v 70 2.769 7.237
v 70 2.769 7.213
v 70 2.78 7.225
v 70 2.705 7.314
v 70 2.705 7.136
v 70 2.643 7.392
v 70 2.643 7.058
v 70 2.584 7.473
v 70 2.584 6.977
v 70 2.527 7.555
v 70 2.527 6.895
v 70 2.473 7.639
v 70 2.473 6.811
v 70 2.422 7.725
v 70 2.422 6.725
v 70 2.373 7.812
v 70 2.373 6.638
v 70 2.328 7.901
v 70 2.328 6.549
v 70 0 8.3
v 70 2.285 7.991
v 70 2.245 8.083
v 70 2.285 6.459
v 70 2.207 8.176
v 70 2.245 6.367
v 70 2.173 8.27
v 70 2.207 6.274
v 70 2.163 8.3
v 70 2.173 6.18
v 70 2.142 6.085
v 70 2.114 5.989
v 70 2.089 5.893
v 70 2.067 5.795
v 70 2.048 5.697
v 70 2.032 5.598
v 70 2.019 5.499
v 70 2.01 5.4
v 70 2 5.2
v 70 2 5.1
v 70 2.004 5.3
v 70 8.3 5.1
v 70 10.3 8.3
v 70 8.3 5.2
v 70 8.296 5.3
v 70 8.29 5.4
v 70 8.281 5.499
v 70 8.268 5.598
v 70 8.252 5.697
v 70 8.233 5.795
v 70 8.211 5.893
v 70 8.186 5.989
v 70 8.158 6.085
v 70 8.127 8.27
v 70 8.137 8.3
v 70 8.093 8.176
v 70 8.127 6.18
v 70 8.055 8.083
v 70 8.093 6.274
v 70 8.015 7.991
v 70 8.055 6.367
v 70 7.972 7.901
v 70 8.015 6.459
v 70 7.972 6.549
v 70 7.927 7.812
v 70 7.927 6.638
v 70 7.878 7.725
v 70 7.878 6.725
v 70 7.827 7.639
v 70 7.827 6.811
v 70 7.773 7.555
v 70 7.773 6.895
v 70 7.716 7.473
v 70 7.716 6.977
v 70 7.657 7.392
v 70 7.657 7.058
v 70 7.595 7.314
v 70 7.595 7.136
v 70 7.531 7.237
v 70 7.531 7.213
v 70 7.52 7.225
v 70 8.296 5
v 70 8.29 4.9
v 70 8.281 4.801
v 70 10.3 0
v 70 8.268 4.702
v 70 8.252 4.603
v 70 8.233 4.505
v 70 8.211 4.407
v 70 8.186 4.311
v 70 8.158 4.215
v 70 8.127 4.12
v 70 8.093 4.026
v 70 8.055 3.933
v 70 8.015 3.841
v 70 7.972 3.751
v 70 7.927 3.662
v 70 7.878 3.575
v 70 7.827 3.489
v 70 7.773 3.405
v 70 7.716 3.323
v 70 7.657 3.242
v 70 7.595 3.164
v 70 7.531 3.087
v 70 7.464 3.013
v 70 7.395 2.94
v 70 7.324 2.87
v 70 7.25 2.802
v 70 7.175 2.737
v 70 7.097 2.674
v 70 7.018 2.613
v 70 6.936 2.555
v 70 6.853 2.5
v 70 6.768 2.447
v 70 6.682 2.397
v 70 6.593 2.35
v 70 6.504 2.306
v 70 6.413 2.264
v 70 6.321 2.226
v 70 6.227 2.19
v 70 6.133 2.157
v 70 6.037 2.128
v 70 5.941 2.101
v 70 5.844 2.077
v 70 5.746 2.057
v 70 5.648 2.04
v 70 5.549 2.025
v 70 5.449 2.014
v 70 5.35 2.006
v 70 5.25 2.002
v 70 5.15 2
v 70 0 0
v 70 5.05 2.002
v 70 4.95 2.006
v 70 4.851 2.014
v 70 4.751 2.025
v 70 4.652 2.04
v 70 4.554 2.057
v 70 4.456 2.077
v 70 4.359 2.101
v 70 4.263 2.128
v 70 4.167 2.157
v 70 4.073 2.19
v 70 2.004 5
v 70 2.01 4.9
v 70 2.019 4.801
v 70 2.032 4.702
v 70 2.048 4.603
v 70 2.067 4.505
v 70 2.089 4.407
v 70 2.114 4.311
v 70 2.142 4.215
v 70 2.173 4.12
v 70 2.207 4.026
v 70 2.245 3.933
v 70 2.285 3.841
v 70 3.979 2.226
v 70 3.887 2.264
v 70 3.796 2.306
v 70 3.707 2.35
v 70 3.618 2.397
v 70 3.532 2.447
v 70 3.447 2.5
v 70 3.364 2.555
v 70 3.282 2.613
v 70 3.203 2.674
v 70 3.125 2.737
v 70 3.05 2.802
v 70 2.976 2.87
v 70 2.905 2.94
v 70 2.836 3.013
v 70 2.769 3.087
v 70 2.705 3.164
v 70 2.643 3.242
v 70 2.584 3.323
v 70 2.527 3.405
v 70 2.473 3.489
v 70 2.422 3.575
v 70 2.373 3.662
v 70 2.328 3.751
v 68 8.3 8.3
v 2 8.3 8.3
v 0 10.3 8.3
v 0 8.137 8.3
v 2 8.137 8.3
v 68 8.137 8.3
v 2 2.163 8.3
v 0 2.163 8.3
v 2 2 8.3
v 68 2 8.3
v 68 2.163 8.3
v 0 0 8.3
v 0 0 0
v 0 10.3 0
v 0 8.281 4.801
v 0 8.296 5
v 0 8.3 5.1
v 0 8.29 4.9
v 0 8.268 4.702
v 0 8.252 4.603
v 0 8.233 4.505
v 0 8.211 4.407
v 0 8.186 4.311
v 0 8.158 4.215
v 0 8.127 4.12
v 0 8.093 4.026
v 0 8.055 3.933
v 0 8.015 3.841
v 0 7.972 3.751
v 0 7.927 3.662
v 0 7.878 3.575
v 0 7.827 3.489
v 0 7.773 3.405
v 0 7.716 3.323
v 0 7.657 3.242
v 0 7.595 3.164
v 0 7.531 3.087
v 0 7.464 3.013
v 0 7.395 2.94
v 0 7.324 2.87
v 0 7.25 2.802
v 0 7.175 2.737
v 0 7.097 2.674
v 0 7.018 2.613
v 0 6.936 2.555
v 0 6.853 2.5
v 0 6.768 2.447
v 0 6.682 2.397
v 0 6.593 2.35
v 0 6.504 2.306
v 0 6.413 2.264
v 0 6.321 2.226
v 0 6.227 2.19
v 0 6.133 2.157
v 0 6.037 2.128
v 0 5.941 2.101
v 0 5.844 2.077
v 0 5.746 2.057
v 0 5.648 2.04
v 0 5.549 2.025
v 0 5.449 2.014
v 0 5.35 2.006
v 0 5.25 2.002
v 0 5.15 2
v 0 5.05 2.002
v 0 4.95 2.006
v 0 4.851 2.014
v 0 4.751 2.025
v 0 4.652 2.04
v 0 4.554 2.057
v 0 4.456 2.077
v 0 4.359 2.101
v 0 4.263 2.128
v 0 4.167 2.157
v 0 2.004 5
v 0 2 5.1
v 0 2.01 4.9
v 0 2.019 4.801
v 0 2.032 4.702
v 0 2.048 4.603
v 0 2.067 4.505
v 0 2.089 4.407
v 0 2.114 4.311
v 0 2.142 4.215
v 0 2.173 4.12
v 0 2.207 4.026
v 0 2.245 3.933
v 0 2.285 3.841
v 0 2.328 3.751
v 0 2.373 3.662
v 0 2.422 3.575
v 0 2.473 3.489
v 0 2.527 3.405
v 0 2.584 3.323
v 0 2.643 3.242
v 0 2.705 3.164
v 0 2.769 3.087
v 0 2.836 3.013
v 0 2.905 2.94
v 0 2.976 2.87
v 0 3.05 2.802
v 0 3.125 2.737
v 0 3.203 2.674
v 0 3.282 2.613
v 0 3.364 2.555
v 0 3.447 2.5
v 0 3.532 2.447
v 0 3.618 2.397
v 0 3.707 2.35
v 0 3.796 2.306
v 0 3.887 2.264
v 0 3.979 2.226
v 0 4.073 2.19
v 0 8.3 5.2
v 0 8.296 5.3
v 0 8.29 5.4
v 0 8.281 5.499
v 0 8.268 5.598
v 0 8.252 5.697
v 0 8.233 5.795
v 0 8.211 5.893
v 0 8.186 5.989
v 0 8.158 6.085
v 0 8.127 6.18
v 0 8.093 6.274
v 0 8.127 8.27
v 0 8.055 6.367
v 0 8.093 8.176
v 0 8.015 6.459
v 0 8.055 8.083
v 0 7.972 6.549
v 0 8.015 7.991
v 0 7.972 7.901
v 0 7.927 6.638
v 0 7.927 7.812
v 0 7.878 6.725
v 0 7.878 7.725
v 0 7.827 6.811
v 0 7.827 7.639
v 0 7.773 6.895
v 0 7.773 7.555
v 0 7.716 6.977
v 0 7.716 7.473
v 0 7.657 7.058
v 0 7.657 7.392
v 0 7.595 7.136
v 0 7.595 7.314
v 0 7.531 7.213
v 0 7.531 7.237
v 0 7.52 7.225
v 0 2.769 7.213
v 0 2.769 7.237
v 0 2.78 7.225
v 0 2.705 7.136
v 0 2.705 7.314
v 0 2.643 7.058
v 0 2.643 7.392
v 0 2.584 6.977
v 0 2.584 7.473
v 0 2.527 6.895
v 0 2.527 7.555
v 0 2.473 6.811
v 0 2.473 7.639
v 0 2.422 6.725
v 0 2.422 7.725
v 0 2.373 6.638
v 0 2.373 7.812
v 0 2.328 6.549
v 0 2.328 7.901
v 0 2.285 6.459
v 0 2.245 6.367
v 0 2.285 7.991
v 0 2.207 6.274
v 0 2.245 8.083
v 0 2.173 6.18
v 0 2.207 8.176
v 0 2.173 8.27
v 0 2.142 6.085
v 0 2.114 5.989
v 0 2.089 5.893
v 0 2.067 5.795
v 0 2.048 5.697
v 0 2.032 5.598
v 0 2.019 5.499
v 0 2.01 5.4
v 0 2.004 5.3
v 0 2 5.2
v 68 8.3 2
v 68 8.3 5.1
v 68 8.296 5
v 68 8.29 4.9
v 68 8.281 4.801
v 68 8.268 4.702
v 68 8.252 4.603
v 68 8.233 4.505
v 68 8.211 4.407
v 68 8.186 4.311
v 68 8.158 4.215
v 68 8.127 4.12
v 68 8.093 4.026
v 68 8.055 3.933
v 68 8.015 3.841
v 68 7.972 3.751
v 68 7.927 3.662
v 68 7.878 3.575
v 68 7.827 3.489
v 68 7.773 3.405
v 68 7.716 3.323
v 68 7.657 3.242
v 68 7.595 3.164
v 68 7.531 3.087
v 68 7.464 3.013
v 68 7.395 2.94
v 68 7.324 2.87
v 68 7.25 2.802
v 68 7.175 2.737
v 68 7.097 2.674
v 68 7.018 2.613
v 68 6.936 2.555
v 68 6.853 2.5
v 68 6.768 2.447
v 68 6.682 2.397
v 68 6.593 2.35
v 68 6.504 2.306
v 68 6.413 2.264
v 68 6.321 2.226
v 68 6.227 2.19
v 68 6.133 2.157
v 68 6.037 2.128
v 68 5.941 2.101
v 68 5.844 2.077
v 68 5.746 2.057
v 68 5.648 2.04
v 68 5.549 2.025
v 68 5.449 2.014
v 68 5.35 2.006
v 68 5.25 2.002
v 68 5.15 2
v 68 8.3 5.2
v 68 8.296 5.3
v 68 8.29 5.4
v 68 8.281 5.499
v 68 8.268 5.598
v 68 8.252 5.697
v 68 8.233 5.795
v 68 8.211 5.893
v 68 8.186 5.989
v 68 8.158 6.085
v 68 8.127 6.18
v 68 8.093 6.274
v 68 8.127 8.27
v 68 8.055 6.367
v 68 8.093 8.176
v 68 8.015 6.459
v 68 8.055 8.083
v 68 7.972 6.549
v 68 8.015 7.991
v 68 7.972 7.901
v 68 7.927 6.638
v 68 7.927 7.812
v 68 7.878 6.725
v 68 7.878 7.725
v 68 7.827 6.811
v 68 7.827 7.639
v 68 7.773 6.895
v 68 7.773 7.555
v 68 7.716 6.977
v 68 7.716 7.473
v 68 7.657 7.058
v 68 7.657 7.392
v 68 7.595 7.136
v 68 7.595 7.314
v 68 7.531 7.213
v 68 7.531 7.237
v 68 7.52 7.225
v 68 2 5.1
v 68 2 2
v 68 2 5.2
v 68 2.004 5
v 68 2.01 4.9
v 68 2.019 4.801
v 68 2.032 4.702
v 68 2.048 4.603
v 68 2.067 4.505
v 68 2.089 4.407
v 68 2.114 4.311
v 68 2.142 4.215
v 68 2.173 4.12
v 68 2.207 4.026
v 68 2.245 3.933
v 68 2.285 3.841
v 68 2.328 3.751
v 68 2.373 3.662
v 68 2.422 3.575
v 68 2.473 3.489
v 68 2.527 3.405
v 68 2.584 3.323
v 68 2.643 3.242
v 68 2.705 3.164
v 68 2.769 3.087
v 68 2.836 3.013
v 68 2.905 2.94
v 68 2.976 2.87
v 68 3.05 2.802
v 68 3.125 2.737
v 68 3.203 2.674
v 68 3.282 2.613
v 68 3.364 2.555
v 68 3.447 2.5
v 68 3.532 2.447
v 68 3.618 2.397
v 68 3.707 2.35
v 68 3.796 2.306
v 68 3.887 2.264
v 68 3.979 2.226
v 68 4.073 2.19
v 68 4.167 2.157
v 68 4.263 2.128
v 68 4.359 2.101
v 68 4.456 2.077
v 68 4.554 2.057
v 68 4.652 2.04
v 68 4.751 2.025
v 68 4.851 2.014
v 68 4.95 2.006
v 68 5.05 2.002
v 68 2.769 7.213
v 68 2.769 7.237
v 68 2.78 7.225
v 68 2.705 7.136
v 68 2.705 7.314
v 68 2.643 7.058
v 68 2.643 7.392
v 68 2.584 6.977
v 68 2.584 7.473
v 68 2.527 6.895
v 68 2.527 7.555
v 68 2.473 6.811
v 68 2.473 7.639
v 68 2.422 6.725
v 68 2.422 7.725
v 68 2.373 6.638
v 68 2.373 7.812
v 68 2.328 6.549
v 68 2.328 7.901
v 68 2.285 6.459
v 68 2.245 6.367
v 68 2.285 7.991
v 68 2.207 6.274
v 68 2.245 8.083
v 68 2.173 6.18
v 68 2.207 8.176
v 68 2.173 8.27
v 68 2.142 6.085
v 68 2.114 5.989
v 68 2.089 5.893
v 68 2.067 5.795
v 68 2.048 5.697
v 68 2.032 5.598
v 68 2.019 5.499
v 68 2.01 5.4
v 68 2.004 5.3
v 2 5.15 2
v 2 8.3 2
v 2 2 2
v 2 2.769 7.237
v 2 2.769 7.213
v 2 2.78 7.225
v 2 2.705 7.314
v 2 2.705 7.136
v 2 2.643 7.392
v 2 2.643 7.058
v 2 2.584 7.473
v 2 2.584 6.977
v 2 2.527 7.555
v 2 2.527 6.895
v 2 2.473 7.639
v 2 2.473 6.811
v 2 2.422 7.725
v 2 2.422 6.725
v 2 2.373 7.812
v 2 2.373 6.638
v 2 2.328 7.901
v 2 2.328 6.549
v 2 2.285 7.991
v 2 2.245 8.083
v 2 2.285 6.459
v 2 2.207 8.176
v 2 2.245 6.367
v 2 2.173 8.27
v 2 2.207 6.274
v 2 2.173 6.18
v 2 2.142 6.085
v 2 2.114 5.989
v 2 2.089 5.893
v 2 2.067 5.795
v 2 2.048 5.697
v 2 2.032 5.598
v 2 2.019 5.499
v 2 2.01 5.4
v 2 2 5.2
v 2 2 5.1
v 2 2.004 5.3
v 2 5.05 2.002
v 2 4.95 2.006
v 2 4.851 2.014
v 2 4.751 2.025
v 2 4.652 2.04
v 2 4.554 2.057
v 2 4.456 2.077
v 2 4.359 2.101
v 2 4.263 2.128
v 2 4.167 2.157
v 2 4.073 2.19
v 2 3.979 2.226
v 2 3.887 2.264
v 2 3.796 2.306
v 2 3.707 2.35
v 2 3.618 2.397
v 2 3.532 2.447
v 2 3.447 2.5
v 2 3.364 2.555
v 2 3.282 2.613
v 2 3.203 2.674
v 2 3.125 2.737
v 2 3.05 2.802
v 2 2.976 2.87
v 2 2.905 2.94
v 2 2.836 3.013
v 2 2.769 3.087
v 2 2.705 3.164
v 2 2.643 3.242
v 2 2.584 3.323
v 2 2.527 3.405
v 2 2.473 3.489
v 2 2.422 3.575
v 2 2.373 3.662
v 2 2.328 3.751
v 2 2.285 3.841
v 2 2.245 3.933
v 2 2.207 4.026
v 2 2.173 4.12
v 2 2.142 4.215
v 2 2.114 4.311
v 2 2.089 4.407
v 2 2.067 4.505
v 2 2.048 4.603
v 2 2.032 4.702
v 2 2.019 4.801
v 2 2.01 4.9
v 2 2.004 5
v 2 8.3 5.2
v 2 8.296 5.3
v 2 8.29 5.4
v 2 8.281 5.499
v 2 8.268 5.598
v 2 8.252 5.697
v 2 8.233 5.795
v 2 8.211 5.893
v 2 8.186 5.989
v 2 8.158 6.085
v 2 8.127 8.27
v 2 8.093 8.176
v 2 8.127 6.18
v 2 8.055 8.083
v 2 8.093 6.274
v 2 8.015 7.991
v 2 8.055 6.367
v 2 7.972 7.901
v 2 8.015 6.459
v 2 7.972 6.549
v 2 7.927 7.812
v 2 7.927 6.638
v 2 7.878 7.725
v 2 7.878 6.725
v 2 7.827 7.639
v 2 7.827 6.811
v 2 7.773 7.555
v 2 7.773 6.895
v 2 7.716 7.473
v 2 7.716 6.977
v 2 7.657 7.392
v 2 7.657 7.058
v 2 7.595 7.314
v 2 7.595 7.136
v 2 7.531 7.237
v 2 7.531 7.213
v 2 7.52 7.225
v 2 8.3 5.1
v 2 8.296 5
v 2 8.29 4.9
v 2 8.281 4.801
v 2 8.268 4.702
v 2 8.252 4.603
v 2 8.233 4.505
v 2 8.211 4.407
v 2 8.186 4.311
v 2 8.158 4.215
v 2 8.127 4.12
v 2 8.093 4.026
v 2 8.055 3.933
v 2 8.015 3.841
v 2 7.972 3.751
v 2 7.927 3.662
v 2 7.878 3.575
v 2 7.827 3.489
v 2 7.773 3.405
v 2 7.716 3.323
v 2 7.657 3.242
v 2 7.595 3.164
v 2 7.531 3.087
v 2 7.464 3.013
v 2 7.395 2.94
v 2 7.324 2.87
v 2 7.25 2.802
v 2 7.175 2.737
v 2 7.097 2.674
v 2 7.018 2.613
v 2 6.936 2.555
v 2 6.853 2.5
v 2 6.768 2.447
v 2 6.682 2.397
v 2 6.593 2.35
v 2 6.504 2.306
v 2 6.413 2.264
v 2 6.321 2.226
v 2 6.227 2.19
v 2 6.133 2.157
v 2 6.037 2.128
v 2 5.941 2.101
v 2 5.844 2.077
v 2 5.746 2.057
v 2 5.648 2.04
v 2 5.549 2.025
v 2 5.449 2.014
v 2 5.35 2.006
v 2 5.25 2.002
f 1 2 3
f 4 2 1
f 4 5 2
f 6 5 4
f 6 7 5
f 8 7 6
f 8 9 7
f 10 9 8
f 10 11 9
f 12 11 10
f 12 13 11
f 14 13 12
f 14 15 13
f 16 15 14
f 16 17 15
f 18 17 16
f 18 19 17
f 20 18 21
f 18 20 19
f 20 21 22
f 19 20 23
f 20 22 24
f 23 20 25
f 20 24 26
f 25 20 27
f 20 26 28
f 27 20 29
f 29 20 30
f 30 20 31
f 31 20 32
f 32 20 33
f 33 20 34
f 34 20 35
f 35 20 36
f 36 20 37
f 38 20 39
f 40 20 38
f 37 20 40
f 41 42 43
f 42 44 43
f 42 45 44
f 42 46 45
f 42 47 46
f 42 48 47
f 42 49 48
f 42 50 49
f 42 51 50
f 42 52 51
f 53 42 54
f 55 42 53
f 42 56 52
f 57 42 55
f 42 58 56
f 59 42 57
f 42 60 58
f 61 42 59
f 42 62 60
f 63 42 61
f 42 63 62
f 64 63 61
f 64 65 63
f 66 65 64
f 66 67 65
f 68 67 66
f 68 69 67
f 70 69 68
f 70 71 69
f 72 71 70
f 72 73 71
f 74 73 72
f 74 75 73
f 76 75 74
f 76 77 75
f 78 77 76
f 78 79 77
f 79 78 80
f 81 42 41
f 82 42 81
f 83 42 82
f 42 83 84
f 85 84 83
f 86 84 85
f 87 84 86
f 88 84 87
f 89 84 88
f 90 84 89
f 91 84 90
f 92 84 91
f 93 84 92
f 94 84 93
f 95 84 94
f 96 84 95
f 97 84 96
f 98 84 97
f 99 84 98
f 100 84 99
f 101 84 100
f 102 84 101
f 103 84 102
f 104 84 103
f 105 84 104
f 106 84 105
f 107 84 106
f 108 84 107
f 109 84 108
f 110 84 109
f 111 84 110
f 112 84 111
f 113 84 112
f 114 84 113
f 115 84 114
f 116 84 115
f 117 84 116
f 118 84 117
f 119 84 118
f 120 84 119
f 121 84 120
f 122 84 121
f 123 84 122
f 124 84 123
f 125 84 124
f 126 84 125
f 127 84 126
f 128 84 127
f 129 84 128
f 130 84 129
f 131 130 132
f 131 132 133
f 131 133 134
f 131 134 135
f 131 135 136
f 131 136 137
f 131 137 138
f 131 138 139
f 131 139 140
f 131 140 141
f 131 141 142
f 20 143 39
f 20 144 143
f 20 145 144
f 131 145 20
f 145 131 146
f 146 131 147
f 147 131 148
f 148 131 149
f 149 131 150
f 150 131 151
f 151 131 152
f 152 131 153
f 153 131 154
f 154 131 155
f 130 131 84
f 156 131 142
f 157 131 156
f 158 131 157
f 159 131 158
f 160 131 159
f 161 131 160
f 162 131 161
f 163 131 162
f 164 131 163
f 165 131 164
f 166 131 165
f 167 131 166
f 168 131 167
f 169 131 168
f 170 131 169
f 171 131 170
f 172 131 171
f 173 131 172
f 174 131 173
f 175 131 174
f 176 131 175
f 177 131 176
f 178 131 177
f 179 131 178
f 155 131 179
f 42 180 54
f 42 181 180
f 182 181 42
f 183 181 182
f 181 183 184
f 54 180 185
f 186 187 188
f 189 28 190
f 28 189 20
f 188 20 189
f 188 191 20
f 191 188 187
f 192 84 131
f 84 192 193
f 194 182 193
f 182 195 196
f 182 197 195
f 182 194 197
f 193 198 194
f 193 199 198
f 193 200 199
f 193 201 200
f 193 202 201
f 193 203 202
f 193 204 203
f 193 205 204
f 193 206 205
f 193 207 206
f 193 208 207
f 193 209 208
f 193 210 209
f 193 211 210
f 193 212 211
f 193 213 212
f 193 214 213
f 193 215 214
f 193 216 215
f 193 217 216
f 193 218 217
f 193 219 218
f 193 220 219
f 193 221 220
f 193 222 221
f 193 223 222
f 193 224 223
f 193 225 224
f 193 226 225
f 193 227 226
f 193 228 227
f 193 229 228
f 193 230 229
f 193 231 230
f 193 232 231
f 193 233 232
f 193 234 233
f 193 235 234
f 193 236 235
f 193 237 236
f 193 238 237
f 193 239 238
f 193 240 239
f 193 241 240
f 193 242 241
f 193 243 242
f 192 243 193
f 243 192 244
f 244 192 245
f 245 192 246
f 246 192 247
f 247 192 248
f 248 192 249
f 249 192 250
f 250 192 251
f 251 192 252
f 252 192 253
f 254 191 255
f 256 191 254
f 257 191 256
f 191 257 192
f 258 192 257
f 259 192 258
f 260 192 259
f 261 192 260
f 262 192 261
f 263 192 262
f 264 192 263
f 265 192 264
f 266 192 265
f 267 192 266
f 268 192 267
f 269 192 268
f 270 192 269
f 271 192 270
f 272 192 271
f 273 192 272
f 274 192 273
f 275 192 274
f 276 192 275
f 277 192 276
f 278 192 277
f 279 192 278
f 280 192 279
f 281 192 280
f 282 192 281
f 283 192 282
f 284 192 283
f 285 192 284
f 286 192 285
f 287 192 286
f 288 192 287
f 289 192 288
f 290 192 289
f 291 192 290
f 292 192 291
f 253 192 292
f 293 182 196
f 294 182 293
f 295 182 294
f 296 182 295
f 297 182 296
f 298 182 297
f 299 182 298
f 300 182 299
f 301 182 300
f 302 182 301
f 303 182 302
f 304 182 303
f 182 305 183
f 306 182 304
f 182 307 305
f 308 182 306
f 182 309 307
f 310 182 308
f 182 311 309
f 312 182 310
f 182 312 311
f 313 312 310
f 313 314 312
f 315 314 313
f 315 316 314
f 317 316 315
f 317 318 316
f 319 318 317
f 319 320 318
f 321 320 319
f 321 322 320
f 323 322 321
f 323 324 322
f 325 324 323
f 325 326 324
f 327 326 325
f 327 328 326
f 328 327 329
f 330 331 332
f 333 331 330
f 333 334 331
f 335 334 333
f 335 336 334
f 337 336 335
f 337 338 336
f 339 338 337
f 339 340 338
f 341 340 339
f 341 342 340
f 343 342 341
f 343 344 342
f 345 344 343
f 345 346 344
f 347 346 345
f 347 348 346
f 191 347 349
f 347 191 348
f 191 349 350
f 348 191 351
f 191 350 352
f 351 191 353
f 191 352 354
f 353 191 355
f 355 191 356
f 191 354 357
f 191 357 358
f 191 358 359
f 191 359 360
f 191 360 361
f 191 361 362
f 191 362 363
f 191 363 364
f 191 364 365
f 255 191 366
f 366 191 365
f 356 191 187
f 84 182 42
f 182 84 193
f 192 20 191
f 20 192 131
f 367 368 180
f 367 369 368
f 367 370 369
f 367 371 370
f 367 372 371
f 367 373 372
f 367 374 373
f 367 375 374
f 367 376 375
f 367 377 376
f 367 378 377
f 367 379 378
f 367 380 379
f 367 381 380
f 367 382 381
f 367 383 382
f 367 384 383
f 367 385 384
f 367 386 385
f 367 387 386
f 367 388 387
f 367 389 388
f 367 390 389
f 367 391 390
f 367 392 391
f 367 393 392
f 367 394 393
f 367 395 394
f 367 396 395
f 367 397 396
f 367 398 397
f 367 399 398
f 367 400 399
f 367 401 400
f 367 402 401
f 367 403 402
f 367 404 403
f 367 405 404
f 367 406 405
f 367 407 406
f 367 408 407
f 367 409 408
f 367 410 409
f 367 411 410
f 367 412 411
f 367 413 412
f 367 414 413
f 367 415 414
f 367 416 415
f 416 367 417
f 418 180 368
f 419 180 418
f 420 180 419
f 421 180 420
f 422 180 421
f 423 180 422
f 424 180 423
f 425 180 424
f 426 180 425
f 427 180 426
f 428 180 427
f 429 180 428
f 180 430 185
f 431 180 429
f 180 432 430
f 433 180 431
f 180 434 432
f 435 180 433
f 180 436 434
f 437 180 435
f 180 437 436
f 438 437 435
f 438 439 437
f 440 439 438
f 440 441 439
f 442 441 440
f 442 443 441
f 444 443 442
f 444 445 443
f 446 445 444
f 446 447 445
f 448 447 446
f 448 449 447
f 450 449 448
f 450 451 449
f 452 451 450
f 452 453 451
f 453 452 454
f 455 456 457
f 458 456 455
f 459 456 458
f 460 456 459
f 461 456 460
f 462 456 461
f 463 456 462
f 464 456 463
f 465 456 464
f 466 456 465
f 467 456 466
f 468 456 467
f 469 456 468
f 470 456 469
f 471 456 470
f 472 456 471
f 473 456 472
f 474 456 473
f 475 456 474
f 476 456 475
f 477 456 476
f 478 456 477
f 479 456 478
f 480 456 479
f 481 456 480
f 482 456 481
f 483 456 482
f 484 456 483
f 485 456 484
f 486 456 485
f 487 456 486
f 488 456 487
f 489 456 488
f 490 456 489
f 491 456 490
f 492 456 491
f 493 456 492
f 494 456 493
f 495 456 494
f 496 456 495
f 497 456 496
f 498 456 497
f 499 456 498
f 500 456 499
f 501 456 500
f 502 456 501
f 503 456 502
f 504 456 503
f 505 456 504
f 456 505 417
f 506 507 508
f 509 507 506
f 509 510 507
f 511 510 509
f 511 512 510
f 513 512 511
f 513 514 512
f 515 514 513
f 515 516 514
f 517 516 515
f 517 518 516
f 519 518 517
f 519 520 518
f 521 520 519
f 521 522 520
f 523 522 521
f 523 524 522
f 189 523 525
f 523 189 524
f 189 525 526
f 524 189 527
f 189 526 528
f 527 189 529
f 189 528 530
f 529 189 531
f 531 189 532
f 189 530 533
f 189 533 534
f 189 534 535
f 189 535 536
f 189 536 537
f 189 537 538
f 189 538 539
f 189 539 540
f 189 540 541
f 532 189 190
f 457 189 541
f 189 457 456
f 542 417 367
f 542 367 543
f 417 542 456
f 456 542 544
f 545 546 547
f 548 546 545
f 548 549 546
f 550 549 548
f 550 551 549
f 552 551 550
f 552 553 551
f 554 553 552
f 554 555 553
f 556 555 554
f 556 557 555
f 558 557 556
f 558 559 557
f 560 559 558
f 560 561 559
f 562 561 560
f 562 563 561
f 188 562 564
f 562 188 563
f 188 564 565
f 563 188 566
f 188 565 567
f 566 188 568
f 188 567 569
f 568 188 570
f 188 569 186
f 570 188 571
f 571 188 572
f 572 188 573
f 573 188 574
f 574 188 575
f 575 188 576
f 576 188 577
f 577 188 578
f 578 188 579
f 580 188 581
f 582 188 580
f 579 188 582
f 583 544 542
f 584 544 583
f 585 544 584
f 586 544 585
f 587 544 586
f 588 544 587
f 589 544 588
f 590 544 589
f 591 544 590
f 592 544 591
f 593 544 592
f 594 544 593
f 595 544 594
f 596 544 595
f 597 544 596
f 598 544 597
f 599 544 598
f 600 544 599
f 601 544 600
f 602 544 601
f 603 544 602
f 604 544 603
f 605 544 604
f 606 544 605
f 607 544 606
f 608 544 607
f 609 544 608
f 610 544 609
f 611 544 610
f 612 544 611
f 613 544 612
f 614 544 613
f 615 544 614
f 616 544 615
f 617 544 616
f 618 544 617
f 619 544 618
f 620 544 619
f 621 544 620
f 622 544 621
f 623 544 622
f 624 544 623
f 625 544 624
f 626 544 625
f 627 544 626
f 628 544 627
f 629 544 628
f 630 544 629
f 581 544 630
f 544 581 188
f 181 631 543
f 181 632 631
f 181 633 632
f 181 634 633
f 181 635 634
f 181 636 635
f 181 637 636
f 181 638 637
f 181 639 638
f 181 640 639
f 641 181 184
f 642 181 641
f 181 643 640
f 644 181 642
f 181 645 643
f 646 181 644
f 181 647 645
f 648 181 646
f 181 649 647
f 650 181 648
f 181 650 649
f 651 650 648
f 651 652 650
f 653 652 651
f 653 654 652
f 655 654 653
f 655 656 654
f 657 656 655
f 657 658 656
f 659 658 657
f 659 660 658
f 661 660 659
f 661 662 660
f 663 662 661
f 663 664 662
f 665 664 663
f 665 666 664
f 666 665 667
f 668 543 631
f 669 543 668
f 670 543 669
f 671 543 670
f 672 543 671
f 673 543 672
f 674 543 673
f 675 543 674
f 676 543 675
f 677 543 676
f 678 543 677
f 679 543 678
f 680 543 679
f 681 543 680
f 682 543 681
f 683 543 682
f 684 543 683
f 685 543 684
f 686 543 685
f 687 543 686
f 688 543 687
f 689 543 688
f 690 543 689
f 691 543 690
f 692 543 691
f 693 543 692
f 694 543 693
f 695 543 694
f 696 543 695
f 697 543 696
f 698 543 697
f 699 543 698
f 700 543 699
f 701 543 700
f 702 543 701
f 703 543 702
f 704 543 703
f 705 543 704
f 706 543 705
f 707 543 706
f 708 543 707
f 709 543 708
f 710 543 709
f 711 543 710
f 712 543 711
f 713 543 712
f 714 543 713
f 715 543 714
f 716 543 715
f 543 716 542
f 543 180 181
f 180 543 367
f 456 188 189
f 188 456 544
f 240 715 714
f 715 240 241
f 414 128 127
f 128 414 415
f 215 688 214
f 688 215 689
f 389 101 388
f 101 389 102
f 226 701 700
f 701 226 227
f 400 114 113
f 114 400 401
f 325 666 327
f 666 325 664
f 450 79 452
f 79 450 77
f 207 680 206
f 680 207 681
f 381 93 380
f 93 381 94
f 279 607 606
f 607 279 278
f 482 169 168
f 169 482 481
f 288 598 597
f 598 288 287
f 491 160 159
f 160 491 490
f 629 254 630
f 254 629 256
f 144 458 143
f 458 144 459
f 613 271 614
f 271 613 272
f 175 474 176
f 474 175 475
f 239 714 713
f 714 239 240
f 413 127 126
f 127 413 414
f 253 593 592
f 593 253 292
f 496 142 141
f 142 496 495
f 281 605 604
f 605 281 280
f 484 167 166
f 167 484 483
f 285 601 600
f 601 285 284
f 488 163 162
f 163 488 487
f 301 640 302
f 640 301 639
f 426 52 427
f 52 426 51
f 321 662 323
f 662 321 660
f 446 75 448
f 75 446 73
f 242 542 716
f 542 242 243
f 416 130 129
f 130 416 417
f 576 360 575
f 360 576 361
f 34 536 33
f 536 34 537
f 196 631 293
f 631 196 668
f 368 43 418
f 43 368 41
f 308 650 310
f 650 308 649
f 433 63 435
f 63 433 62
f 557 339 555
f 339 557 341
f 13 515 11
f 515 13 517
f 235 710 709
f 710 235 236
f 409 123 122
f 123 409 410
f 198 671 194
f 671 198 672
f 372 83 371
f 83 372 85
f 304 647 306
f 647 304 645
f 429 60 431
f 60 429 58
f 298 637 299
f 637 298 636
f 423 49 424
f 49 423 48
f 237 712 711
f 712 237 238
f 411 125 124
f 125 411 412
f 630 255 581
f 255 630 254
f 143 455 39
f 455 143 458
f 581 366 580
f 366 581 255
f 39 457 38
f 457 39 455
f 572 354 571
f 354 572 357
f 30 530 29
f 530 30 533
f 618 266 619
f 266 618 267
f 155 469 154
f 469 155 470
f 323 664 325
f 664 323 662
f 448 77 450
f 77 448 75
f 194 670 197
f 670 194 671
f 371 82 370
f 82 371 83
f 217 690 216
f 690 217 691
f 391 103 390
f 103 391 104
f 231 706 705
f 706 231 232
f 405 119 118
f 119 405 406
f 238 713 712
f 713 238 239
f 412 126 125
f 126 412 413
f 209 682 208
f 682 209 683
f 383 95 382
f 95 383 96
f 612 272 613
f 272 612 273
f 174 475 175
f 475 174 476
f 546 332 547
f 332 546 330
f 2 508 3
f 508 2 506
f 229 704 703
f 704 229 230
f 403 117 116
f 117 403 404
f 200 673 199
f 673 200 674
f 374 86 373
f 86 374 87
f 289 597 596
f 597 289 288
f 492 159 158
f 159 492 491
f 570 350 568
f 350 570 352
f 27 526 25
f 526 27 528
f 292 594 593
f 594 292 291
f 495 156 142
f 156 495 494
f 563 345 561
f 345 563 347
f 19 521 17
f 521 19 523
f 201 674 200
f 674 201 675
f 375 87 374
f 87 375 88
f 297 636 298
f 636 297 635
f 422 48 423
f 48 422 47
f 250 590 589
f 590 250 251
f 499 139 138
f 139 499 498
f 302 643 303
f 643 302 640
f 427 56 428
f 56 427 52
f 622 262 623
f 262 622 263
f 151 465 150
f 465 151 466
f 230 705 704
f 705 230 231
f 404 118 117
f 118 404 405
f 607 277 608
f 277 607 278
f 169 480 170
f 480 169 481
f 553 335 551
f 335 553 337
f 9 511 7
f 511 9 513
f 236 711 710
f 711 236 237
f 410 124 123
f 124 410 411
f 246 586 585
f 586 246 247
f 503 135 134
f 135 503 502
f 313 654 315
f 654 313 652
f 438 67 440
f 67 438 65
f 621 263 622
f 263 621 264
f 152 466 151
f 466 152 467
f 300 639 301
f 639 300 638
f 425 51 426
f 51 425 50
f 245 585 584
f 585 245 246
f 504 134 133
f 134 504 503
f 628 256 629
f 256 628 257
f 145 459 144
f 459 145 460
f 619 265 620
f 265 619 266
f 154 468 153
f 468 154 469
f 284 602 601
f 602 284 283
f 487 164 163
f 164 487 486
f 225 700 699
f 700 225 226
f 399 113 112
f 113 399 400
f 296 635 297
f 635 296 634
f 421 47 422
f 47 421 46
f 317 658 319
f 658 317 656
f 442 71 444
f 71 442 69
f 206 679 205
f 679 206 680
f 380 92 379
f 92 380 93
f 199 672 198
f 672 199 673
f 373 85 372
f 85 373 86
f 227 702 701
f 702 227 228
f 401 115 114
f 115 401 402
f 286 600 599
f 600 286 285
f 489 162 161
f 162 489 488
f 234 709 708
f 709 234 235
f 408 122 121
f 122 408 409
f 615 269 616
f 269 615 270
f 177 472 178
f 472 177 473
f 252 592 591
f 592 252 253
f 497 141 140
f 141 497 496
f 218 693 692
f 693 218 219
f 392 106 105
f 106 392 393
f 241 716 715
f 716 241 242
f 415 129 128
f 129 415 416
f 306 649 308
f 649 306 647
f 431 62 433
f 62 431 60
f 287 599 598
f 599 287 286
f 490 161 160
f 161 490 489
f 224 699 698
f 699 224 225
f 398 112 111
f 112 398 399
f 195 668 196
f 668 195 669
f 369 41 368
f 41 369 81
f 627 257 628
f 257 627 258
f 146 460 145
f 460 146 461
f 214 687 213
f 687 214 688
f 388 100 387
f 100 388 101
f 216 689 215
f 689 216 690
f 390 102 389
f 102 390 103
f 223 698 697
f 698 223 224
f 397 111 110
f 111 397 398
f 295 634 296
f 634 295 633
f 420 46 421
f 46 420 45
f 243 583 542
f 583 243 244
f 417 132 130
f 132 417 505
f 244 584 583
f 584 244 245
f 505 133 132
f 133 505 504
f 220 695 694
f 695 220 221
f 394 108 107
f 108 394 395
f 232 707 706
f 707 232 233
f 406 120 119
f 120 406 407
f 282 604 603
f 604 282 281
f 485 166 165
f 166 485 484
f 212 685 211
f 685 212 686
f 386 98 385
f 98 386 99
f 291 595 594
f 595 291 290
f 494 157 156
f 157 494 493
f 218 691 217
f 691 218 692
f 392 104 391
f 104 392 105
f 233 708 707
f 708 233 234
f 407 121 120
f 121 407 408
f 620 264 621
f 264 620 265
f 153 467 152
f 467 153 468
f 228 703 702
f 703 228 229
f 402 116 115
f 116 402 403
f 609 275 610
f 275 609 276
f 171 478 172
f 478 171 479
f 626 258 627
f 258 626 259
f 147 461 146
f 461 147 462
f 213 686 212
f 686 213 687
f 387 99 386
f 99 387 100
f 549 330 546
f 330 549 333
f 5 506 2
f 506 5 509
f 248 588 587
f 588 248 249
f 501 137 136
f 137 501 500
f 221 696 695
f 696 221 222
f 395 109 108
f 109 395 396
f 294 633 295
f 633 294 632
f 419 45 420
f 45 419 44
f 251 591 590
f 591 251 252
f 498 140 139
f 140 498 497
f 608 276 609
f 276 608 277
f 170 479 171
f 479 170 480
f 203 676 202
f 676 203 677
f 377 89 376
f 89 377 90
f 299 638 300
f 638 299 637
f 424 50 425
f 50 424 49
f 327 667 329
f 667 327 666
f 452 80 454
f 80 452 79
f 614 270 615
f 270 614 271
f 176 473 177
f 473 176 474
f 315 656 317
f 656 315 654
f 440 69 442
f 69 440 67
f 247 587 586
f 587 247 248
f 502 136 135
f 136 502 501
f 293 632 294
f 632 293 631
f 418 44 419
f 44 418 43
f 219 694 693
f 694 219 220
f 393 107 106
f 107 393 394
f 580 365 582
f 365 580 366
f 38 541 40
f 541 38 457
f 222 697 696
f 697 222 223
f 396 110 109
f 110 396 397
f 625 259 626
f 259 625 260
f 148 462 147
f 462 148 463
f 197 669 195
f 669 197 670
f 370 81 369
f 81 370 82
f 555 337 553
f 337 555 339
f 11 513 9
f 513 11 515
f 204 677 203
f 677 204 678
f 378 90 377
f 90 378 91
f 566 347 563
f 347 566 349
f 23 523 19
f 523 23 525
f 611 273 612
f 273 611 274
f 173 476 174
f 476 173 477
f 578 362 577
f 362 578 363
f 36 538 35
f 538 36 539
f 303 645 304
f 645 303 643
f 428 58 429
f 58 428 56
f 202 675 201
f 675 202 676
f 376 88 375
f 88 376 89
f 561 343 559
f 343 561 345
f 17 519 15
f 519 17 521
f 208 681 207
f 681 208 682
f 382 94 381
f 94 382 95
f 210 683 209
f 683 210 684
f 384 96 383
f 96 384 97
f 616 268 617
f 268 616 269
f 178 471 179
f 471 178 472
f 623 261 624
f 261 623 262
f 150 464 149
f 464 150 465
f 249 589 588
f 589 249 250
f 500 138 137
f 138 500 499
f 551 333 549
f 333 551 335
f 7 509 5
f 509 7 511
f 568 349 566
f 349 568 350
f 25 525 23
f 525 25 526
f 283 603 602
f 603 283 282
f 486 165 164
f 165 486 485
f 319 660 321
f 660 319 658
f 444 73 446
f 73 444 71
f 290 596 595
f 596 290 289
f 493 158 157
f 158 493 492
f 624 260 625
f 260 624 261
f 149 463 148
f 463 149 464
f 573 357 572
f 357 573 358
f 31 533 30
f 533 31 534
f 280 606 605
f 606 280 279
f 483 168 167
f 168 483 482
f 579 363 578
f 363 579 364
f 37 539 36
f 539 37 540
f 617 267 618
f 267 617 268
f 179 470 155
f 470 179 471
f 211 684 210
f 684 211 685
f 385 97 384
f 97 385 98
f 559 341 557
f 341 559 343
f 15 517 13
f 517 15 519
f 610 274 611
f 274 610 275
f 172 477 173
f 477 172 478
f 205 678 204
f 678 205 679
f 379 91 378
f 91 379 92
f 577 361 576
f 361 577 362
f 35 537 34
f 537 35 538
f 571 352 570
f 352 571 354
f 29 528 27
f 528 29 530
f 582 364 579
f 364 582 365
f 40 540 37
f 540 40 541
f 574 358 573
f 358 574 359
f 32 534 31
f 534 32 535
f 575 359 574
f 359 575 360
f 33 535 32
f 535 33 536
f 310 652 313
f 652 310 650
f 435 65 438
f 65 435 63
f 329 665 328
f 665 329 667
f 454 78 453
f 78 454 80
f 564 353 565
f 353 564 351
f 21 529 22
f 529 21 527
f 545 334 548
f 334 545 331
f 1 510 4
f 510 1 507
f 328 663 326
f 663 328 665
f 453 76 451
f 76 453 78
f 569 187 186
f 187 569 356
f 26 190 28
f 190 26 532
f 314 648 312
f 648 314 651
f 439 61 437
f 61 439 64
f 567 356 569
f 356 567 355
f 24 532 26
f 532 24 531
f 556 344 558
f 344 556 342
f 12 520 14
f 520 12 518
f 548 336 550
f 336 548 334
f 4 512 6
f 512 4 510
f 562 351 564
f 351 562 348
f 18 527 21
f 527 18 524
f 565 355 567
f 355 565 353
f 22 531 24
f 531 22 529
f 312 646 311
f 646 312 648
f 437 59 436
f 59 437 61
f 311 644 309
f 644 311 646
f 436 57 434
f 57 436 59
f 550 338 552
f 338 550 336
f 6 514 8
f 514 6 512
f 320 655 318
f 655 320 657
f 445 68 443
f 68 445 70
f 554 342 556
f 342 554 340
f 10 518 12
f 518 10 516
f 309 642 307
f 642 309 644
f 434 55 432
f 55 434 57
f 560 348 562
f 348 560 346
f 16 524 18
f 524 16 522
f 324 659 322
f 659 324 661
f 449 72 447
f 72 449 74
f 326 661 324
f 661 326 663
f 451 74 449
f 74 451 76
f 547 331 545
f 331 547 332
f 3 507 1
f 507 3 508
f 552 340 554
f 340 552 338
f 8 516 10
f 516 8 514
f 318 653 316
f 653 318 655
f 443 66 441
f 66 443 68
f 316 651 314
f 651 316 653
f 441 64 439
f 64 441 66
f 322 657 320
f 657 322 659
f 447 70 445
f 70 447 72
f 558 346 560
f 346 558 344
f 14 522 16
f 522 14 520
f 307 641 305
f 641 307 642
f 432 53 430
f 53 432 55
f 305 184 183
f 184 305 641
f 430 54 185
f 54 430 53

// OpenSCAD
// Stem Diameter
d = 6.3;
// Support Length
l = 70;
// Support Thickness
t = 2;

$fa = 0.1;
$fs = 0.1;

difference() {
	cube([l, d + (2 * t), d + t]);
	translate([t, t, t])
	cube([l - (2 * t), d, d + 0.1]);
	rotate([0, 90, 0])
	translate([-t - (d / 2), t + (d / 2), -0.1])
	cylinder(r = d / 2, h = l + 0.2);
	rotate([0, 90, 0])
	translate([-t - d - 1, t + (d / 2), -0.1])
	cylinder(r = d / 2, h = l + 0.2);
}
